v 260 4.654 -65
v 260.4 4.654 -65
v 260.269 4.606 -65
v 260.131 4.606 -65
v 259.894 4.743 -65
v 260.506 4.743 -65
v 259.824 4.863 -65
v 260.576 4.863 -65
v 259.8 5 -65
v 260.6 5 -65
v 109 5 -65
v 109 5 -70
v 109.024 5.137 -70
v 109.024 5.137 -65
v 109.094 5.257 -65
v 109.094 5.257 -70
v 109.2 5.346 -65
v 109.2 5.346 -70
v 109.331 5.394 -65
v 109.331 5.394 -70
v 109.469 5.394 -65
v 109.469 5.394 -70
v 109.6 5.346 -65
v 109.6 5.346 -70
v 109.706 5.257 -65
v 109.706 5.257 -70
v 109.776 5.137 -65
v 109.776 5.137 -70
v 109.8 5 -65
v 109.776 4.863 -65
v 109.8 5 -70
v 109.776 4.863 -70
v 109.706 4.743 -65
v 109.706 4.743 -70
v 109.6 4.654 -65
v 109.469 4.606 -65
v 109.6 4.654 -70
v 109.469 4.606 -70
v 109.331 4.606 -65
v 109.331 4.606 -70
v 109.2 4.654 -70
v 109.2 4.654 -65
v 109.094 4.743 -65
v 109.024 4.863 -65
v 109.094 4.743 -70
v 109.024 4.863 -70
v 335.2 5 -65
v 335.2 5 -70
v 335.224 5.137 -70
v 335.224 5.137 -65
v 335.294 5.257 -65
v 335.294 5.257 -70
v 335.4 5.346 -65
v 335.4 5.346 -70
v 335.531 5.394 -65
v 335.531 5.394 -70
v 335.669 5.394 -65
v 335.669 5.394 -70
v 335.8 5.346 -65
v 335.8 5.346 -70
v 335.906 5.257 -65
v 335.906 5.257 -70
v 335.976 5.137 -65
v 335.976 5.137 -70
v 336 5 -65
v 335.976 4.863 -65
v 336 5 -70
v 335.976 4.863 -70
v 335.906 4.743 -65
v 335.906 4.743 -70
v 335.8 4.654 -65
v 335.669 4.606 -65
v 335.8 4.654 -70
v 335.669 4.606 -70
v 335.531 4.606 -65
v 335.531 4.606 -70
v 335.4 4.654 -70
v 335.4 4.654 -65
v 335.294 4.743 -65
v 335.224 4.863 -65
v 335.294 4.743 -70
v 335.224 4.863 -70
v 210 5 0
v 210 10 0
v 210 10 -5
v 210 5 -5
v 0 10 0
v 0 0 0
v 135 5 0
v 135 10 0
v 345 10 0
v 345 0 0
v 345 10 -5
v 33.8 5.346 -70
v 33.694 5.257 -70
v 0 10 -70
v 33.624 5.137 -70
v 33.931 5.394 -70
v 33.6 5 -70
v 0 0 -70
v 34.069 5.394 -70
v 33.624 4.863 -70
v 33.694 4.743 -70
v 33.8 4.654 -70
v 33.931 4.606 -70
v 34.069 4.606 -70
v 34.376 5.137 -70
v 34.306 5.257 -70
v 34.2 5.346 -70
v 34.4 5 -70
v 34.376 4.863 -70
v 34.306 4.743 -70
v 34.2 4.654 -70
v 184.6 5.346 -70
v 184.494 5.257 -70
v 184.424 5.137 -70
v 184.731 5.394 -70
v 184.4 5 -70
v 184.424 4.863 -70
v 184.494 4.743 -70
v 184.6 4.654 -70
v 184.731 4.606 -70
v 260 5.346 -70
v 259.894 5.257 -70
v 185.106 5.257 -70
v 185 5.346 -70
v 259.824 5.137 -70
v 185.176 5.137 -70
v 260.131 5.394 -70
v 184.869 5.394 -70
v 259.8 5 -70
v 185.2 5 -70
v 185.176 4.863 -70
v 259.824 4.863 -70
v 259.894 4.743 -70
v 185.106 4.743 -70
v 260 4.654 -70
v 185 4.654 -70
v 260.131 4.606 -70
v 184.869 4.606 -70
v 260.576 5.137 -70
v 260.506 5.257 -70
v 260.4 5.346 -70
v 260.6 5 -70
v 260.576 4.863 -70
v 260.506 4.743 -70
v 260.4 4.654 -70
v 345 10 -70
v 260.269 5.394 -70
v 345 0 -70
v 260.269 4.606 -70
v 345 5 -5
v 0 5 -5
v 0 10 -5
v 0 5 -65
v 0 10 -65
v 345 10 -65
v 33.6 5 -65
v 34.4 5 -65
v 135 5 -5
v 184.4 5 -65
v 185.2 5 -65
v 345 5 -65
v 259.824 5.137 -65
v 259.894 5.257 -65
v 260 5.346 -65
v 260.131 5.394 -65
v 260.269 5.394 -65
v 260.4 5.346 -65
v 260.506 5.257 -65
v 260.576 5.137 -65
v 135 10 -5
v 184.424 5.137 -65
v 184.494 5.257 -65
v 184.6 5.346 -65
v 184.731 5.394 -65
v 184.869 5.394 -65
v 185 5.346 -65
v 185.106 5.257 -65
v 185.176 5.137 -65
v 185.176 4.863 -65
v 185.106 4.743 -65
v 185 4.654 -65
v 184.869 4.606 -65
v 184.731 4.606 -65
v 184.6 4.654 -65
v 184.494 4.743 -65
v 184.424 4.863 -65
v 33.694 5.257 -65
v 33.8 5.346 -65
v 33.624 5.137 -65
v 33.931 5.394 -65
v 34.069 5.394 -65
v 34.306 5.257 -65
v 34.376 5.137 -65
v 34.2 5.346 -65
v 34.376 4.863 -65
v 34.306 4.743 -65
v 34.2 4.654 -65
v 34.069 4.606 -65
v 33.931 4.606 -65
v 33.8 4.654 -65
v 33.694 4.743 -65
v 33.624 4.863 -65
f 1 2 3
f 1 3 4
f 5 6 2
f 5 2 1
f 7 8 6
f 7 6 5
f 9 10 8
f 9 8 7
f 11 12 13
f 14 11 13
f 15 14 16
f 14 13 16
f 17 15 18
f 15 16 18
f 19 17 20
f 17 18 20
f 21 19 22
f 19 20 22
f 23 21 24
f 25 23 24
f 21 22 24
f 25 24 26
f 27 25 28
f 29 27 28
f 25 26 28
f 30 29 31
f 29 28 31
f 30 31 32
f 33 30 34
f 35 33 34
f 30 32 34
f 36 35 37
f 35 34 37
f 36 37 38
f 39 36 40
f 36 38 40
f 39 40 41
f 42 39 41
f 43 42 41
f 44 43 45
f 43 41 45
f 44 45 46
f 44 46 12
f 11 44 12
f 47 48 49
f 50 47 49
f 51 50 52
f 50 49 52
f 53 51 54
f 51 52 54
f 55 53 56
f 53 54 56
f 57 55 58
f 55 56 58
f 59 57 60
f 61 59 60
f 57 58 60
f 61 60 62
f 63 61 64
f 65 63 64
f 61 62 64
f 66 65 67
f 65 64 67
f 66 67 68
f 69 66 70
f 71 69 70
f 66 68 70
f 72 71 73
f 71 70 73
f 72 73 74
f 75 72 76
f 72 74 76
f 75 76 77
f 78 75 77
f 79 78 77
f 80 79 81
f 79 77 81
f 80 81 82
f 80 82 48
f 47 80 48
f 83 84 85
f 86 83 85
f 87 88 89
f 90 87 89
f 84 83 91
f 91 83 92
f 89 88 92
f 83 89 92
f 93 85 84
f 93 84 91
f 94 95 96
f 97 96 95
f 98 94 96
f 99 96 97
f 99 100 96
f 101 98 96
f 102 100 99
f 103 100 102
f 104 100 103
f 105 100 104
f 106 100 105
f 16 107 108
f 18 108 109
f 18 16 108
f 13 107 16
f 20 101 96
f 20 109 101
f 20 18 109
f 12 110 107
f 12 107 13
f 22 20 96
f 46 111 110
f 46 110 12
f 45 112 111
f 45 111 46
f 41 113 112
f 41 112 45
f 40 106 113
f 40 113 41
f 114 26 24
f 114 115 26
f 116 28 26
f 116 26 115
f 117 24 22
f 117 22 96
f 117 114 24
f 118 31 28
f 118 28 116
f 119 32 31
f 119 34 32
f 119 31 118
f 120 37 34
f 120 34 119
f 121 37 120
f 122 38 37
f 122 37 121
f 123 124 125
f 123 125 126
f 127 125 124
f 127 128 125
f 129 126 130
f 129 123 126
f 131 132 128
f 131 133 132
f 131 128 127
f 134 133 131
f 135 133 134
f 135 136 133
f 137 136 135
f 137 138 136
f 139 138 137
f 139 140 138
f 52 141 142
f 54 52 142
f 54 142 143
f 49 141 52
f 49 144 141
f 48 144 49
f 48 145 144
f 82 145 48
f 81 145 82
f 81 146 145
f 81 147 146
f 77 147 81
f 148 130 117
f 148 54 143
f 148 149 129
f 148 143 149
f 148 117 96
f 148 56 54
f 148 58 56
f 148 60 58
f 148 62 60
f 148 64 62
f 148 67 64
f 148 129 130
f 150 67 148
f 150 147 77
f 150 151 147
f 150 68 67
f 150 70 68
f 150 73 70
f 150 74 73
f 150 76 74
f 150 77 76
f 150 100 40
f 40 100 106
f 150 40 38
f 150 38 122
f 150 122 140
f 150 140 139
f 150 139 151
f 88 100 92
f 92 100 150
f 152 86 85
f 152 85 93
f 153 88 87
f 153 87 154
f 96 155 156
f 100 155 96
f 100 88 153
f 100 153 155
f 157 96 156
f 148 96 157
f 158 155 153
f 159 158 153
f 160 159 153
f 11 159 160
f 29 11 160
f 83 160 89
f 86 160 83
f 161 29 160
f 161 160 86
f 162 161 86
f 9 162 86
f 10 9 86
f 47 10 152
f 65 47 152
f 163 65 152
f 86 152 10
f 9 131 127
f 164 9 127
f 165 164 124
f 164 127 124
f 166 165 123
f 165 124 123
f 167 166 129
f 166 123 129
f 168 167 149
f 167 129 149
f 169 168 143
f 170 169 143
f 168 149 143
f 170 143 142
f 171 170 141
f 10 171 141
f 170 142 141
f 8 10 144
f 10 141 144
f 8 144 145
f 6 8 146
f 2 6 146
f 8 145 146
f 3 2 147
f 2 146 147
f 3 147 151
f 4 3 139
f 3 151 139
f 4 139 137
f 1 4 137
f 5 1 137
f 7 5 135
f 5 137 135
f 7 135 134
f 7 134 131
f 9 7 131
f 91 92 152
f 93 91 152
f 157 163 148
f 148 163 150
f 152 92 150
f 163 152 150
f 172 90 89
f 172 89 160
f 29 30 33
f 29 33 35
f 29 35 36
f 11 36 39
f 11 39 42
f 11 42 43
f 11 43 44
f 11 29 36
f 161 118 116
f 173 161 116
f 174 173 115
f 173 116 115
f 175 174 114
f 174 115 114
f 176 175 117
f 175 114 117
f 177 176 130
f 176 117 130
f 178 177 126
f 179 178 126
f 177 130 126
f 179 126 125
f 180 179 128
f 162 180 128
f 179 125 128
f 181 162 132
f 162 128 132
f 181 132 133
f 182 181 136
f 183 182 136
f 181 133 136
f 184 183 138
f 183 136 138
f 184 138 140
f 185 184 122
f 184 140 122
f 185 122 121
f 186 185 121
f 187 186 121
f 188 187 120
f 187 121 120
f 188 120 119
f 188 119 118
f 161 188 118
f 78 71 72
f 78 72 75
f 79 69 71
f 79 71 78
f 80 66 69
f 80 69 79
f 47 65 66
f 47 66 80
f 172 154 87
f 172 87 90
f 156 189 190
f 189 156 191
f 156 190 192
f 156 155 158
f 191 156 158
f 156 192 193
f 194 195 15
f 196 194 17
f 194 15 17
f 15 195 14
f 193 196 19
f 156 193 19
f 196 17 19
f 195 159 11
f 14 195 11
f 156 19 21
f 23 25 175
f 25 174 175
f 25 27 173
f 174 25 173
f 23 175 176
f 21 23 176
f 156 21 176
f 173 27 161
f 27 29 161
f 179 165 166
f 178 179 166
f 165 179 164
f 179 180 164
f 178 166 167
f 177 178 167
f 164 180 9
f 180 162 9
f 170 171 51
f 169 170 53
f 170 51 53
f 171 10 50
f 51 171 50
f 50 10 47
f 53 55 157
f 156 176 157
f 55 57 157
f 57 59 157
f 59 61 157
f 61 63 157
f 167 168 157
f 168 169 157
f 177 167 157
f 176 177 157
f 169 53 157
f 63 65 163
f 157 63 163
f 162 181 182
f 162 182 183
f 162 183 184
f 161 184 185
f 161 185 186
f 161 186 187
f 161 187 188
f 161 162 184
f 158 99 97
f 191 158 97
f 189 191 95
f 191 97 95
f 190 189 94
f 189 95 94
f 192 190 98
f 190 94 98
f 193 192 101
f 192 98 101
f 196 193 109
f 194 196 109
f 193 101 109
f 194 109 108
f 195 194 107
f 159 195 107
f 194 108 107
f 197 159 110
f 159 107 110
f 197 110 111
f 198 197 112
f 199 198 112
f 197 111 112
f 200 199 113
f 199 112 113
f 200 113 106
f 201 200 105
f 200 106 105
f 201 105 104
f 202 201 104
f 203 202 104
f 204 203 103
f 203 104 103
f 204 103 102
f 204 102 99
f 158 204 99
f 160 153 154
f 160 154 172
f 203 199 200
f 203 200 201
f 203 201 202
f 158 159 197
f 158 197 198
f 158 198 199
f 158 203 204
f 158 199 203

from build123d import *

# Parameters (mm, degrees)
SKETCH1_W           = 345
SKETCH1_H           = 70
BOSS_EXTRUDE1_DEPTH = 5
SKETCH2_W           = 345
SKETCH2_H           = 5
BOSS_EXTRUDE2_DEPTH = 5
SKETCH3_W           = 75
SKETCH3_H           = 5
CUT_EXTRUDE1_DEPTH  = 5
SKETCH4_R           = 0.4
CUT_EXTRUDE2_DEPTH  = 5


with BuildPart() as part:
    # Sketch1 → Boss-Extrude1 (new body)
    with BuildSketch(Plane(origin=(0, 0, 0), x_dir=(1, 0, 0), z_dir=(0, 1, 0))):
        with Locations((172.5, 35)):
            Rectangle(SKETCH1_W, SKETCH1_H)
    extrude(amount=BOSS_EXTRUDE1_DEPTH)

    # Sketch2 → Boss-Extrude2 (add)
    with BuildSketch(Plane(origin=(0, 5, 0), x_dir=(1, 0, 0), z_dir=(0, 1, 0))):
        with Locations((172.5, 67.5)):
            Rectangle(SKETCH2_W, SKETCH2_H)
        with Locations((172.5, 2.5)):
            Rectangle(SKETCH2_W, SKETCH2_H)
    extrude(amount=BOSS_EXTRUDE2_DEPTH)

    # Sketch3 → Cut-Extrude1 (cut)
    with BuildSketch(Plane(origin=(0, 10, 0), x_dir=(1, 0, 0), z_dir=(0, 1, 0))):
        with Locations((172.5, 2.5)):
            Rectangle(SKETCH3_W, SKETCH3_H)
    extrude(amount=-CUT_EXTRUDE1_DEPTH, mode=Mode.SUBTRACT)

    # Sketch4 → Cut-Extrude2 (cut)
    with BuildSketch(Plane(origin=(0, 0, -70), x_dir=(-1, 0, 0), z_dir=(0, 0, -1))):
        with Locations((-335.6, 5)):
            Circle(SKETCH4_R)
        with Locations((-260.2, 5)):
            Circle(SKETCH4_R)
        with Locations((-184.8, 5)):
            Circle(SKETCH4_R)
        with Locations((-109.4, 5)):
            Circle(SKETCH4_R)
        with Locations((-34, 5)):
            Circle(SKETCH4_R)
    extrude(amount=-CUT_EXTRUDE2_DEPTH, mode=Mode.SUBTRACT)


solid = part.part
